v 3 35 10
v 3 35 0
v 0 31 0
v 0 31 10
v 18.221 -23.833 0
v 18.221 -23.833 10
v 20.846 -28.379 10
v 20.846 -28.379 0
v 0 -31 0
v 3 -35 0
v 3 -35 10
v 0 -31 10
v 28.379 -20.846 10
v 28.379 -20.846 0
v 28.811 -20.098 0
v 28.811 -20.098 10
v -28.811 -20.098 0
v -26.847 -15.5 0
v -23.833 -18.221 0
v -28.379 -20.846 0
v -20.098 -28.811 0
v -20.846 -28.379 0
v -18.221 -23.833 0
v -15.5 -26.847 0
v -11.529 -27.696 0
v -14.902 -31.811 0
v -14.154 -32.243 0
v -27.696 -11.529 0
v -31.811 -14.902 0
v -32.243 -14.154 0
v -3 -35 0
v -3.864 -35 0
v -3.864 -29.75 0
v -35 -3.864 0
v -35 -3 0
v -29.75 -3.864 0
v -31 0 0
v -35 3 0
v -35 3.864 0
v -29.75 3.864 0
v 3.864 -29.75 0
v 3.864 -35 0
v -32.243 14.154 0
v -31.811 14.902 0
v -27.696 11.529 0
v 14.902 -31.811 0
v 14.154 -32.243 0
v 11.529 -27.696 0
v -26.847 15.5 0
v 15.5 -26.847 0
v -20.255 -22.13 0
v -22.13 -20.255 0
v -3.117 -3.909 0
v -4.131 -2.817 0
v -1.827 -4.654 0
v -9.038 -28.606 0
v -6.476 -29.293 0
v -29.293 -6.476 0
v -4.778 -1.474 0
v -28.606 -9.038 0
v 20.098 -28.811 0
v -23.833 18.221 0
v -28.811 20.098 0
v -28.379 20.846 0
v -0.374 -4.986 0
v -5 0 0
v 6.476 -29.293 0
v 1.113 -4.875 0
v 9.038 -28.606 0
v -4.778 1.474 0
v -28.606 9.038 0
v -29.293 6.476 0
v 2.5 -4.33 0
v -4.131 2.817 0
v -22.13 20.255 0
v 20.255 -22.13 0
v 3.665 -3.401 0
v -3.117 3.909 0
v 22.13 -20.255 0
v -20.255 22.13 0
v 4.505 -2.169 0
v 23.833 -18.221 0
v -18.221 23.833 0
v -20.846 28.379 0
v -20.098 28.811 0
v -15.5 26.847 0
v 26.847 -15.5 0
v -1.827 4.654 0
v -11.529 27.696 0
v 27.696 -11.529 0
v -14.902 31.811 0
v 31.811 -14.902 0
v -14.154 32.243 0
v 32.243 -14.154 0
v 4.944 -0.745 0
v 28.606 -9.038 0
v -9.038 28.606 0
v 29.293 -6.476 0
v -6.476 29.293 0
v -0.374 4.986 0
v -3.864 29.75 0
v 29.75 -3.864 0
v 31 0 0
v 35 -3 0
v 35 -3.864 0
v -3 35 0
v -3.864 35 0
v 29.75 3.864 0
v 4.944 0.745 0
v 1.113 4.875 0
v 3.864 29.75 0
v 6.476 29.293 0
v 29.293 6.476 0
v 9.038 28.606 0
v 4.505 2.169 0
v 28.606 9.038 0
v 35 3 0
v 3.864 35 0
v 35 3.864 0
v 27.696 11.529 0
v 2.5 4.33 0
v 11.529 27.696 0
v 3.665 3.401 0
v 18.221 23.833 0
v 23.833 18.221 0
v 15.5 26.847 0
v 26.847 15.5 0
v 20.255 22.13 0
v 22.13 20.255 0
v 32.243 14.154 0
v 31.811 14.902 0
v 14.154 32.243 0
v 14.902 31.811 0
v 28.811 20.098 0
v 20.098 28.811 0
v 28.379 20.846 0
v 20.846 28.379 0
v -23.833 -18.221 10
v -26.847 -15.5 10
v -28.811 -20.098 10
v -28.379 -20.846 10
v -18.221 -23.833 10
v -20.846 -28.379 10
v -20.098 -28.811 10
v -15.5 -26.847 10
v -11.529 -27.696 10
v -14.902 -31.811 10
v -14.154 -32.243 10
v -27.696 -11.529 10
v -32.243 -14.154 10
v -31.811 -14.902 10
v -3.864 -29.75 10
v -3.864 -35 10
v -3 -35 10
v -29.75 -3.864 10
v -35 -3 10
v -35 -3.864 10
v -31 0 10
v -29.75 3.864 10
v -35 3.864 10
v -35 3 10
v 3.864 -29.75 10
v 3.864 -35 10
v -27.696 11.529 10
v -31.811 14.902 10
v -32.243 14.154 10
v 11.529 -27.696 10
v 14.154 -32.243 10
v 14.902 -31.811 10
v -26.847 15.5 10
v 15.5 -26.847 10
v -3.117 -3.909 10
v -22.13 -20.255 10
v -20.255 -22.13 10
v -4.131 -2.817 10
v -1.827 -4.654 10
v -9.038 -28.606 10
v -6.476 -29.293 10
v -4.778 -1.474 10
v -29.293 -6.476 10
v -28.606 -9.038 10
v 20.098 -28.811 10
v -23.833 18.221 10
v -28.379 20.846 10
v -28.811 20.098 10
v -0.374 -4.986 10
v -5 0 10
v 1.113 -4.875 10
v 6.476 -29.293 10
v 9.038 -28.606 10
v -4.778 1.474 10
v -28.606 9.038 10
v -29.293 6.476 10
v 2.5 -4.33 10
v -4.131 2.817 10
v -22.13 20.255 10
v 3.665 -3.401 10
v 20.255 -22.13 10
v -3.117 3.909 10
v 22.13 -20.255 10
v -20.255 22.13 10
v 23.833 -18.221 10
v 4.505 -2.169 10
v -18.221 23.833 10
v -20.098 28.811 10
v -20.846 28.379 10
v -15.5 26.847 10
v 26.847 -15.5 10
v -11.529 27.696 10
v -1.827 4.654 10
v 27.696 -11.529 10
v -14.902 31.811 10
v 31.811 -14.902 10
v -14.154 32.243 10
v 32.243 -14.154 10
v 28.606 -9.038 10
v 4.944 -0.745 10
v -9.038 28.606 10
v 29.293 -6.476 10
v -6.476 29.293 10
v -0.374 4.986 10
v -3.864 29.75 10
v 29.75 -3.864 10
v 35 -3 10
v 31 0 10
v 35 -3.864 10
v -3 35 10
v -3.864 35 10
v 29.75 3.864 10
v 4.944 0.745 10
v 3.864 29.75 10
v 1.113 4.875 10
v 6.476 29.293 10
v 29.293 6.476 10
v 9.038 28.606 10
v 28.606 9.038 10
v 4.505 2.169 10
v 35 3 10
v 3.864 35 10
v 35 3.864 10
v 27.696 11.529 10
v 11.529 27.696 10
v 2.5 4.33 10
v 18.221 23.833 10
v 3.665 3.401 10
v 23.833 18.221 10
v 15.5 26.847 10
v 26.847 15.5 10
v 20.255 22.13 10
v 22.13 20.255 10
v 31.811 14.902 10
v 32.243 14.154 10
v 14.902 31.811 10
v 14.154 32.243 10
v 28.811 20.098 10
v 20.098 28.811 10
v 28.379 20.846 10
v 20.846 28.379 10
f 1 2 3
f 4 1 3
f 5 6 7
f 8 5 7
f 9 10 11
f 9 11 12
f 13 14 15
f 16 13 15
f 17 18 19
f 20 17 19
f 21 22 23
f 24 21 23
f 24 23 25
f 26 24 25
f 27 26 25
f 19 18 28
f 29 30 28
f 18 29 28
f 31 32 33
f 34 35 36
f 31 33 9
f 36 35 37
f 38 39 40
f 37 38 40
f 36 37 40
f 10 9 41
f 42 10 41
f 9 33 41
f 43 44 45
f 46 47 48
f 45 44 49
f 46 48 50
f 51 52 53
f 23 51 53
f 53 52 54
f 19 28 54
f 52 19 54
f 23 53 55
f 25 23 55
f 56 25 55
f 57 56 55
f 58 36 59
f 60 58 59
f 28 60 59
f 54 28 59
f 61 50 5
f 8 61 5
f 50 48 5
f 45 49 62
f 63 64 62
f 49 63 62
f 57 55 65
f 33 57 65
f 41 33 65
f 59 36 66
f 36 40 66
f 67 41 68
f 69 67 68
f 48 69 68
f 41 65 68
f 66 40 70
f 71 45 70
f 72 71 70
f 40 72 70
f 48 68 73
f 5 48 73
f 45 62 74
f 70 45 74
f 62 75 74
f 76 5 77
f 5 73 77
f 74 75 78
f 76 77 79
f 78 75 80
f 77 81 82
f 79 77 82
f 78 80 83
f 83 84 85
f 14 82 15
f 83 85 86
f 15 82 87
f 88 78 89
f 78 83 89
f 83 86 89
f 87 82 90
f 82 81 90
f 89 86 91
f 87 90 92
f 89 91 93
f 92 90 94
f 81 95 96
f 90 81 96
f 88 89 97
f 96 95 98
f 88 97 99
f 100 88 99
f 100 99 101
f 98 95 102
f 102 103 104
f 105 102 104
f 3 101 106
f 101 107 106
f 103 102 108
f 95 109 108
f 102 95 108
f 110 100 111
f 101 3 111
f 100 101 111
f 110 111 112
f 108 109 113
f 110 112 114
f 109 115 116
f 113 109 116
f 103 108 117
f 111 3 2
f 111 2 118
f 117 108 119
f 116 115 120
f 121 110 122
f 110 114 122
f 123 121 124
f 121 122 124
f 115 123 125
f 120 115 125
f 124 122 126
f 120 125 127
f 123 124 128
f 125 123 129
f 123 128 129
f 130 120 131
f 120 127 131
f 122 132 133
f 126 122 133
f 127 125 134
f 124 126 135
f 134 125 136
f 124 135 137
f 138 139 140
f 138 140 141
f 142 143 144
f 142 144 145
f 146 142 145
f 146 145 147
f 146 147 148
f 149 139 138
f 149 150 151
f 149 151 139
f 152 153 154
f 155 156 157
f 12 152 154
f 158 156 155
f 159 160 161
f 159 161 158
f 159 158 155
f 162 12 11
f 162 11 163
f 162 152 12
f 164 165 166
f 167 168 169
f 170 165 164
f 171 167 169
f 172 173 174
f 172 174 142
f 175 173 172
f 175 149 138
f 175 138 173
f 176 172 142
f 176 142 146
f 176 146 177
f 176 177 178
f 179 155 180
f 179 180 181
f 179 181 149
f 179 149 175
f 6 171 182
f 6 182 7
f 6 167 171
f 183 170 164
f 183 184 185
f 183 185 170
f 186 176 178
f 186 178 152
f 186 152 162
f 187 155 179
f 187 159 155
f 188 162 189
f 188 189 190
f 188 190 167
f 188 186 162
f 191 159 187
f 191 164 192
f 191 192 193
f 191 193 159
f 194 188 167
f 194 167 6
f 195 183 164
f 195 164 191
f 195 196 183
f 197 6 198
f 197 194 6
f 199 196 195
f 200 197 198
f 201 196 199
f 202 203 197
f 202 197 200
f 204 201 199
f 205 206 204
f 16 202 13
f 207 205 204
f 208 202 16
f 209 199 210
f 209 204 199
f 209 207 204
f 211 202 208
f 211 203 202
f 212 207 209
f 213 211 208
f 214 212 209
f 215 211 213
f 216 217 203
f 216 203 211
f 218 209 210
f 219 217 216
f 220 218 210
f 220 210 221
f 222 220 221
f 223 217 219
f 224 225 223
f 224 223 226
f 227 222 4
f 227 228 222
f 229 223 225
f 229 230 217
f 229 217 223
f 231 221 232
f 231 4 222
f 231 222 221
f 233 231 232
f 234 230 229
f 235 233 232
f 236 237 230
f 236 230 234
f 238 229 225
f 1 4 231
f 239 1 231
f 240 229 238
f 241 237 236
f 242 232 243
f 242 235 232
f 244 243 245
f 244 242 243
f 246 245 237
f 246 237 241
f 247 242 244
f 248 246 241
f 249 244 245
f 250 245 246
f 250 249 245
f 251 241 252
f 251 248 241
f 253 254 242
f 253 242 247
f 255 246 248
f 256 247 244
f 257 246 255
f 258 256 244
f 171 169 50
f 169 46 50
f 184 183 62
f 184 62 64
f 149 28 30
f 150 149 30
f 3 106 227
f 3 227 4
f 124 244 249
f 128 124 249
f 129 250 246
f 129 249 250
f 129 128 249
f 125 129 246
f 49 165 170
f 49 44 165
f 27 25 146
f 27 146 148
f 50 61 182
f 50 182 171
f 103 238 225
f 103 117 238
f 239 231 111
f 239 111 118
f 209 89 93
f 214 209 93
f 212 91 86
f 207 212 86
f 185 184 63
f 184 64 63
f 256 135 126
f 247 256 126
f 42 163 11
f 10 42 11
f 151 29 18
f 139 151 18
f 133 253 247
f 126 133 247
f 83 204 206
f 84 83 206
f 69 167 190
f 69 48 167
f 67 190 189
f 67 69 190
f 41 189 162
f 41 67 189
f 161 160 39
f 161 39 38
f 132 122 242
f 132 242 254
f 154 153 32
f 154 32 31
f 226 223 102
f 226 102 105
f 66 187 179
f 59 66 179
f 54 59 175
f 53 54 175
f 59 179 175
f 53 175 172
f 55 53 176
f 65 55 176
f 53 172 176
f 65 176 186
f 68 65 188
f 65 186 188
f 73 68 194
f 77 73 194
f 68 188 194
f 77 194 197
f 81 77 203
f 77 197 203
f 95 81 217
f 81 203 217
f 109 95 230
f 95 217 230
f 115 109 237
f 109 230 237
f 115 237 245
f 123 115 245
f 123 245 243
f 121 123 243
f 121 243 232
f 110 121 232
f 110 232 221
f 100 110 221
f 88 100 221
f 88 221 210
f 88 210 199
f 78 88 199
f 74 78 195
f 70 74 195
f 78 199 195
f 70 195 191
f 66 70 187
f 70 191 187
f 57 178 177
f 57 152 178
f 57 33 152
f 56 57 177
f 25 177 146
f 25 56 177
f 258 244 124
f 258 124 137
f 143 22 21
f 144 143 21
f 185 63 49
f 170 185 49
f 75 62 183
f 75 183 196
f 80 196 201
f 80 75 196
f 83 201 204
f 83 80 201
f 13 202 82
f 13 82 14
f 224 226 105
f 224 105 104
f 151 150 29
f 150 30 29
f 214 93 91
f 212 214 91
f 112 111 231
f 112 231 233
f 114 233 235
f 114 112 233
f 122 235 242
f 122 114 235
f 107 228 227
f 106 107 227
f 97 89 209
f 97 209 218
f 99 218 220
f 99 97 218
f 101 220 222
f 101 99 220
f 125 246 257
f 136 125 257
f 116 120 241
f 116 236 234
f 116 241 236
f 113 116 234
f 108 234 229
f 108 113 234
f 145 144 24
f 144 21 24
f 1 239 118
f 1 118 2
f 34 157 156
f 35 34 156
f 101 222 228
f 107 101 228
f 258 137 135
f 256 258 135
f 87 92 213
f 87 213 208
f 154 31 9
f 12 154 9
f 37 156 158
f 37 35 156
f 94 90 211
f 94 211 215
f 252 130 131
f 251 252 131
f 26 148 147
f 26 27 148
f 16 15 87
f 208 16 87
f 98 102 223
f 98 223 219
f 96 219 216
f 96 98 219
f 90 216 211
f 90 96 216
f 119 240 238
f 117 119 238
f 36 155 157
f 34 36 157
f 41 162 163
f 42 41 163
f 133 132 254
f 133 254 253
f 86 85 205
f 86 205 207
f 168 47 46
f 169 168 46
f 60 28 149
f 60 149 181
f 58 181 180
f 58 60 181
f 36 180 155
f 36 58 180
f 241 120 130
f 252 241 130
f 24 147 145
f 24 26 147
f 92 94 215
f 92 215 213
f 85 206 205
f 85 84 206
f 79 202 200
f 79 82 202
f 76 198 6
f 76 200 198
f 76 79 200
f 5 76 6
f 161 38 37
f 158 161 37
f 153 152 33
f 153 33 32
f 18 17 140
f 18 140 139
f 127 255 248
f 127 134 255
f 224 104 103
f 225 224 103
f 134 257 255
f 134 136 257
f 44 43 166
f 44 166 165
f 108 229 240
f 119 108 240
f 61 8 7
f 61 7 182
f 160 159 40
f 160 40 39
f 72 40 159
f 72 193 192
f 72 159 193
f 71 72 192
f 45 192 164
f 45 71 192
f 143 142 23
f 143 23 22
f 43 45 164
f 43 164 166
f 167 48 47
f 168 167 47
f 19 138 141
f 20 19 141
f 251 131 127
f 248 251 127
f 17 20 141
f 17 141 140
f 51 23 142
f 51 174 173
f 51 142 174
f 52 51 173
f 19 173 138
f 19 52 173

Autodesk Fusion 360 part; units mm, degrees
sketch "turn wheel" plane through (0, 0, 0) normal (0, 0, 1) x (1, 0, 0)
  circle A0 centre (0, 0) radius 30
  line L0 (-3.8635, 29.7502) -> (-3.8635, 35)
  line L1 (-3.8635, 35) -> (-3, 35)
  line L2 (-3, 35) -> (0, 31)
  line L3 (0, 35) -> (0, 30) construction
  line L4 (3.8635, 29.7502) -> (3.8635, 35)
  line L5 (3.8635, 35) -> (3, 35)
  line L6 (3, 35) -> (0, 31)
  line L7 (-18.2209, 23.8327) -> (-20.8458, 28.3792)
  line L8 (-20.0981, 28.8109) -> (-15.5, 26.8468)
  line L9 (-20.8458, 28.3792) -> (-20.0981, 28.8109)
  line L10 (-14.9019, 31.8109) -> (-15.5, 26.8468)
  line L11 (-14.1542, 32.2426) -> (-14.9019, 31.8109)
  line L12 (-11.5292, 27.6961) -> (-14.1542, 32.2426)
  line L13 (-27.6961, 11.5292) -> (-32.2426, 14.1542)
  line L14 (-31.8109, 14.9019) -> (-26.8468, 15.5)
  line L15 (-32.2426, 14.1542) -> (-31.8109, 14.9019)
  line L16 (-28.8109, 20.0981) -> (-26.8468, 15.5)
  line L17 (-28.3792, 20.8458) -> (-28.8109, 20.0981)
  line L18 (-23.8327, 18.2209) -> (-28.3792, 20.8458)
  line L19 (-29.7502, -3.8635) -> (-35, -3.8635)
  line L20 (-35, -3) -> (-31, 0)
  line L21 (-35, -3.8635) -> (-35, -3)
  line L22 (-35, 3) -> (-31, 0)
  line L23 (-35, 3.8635) -> (-35, 3)
  line L24 (-29.7502, 3.8635) -> (-35, 3.8635)
  line L25 (-23.8327, -18.2209) -> (-28.3792, -20.8458)
  line L26 (-28.8109, -20.0981) -> (-26.8468, -15.5)
  line L27 (-28.3792, -20.8458) -> (-28.8109, -20.0981)
  line L28 (-31.8109, -14.9019) -> (-26.8468, -15.5)
  line L29 (-32.2426, -14.1542) -> (-31.8109, -14.9019)
  line L30 (-27.6961, -11.5292) -> (-32.2426, -14.1542)
  line L31 (-11.5292, -27.6961) -> (-14.1542, -32.2426)
  line L32 (-14.9019, -31.8109) -> (-15.5, -26.8468)
  line L33 (-14.1542, -32.2426) -> (-14.9019, -31.8109)
  line L34 (-20.0981, -28.8109) -> (-15.5, -26.8468)
  line L35 (-20.8458, -28.3792) -> (-20.0981, -28.8109)
  line L36 (-18.2209, -23.8327) -> (-20.8458, -28.3792)
  line L37 (3.8635, -29.7502) -> (3.8635, -35)
  line L38 (3, -35) -> (0, -31)
  line L39 (3.8635, -35) -> (3, -35)
  line L40 (-3, -35) -> (0, -31)
  line L41 (-3.8635, -35) -> (-3, -35)
  line L42 (-3.8635, -29.7502) -> (-3.8635, -35)
  line L43 (18.2209, -23.8327) -> (20.8458, -28.3792)
  line L44 (20.0981, -28.8109) -> (15.5, -26.8468)
  line L45 (20.8458, -28.3792) -> (20.0981, -28.8109)
  line L46 (14.9019, -31.8109) -> (15.5, -26.8468)
  line L47 (14.1542, -32.2426) -> (14.9019, -31.8109)
  line L48 (11.5292, -27.6961) -> (14.1542, -32.2426)
  line L49 (27.6961, -11.5292) -> (32.2426, -14.1542)
  line L50 (31.8109, -14.9019) -> (26.8468, -15.5)
  line L51 (32.2426, -14.1542) -> (31.8109, -14.9019)
  line L52 (28.8109, -20.0981) -> (26.8468, -15.5)
  line L53 (28.3792, -20.8458) -> (28.8109, -20.0981)
  line L54 (23.8327, -18.2209) -> (28.3792, -20.8458)
  line L55 (29.7502, 3.8635) -> (35, 3.8635)
  line L56 (35, 3) -> (31, 0)
  line L57 (35, 3.8635) -> (35, 3)
  line L58 (35, -3) -> (31, 0)
  line L59 (35, -3.8635) -> (35, -3)
  line L60 (29.7502, -3.8635) -> (35, -3.8635)
  line L61 (23.8327, 18.2209) -> (28.3792, 20.8458)
  line L62 (28.8109, 20.0981) -> (26.8468, 15.5)
  line L63 (28.3792, 20.8458) -> (28.8109, 20.0981)
  line L64 (31.8109, 14.9019) -> (26.8468, 15.5)
  line L65 (32.2426, 14.1542) -> (31.8109, 14.9019)
  line L66 (27.6961, 11.5292) -> (32.2426, 14.1542)
  line L67 (11.5292, 27.6961) -> (14.1542, 32.2426)
  line L68 (14.9019, 31.8109) -> (15.5, 26.8468)
  line L69 (14.1542, 32.2426) -> (14.9019, 31.8109)
  line L70 (20.0981, 28.8109) -> (15.5, 26.8468)
  line L71 (20.8458, 28.3792) -> (20.0981, 28.8109)
  line L72 (18.2209, 23.8327) -> (20.8458, 28.3792)
  dimension "d1" = 60
  dimension "d2" = 5.2498
  dimension "d3" = 0.8635
  dimension "d4" = 5
  dimension "d6" = 360
extrude "Extrude1" add sketch "turn wheel" along normal blind 10
sketch "hole punch" plane through (0, 0, 10) normal (0, 0, 1) x (-1, 0, 0)
  arc A0 (-23.8327, -18.2209) -> (-18.2209, -23.8327) centre (0, 0) ccw
  line L0 (-18.2209, -23.8327) -> (-20.8458, -28.3792)
  line L1 (-20.8458, -28.3792) -> (-20.0981, -28.8109)
  line L2 (-20.0981, -28.8109) -> (-15.5, -26.8468)
  line L3 (-15.5, -26.8468) -> (-14.9019, -31.8109)
  line L4 (-14.9019, -31.8109) -> (-14.1542, -32.2426)
  line L5 (-14.1542, -32.2426) -> (-11.5292, -27.6961)
  arc A1 (-11.5292, -27.6961) -> (-3.8635, -29.7502) centre (0, 0) ccw
  line L6 (-3.8635, -29.7502) -> (-3.8635, -35)
  line L7 (-3.8635, -35) -> (-3, -35)
  line L8 (-3, -35) -> (0, -31)
  line L9 (0, -31) -> (3, -35)
  line L10 (3, -35) -> (3.8635, -35)
  line L11 (3.8635, -35) -> (3.8635, -29.7502)
  arc A2 (3.8635, -29.7502) -> (11.5292, -27.6961) centre (0, 0) ccw
  line L12 (11.5292, -27.6961) -> (14.1542, -32.2426)
  line L13 (14.1542, -32.2426) -> (14.9019, -31.8109)
  line L14 (14.9019, -31.8109) -> (15.5, -26.8468)
  line L15 (15.5, -26.8468) -> (20.0981, -28.8109)
  line L16 (20.0981, -28.8109) -> (20.8458, -28.3792)
  line L17 (20.8458, -28.3792) -> (18.2209, -23.8327)
  arc A3 (18.2209, -23.8327) -> (23.8327, -18.2209) centre (0, 0) ccw
  line L18 (23.8327, -18.2209) -> (28.3792, -20.8458)
  line L19 (28.3792, -20.8458) -> (28.8109, -20.0981)
  line L20 (28.8109, -20.0981) -> (26.8468, -15.5)
  line L21 (26.8468, -15.5) -> (31.8109, -14.9019)
  line L22 (31.8109, -14.9019) -> (32.2426, -14.1542)
  line L23 (32.2426, -14.1542) -> (27.6961, -11.5292)
  arc A4 (27.6961, -11.5292) -> (29.7502, -3.8635) centre (0, 0) ccw
  line L24 (29.7502, -3.8635) -> (35, -3.8635)
  line L25 (35, -3.8635) -> (35, -3)
  line L26 (35, -3) -> (31, 0)
  line L27 (31, 0) -> (35, 3)
  line L28 (35, 3) -> (35, 3.8635)
  line L29 (35, 3.8635) -> (29.7502, 3.8635)
  arc A5 (29.7502, 3.8635) -> (27.6961, 11.5292) centre (0, 0) ccw
  line L30 (27.6961, 11.5292) -> (32.2426, 14.1542)
  line L31 (32.2426, 14.1542) -> (31.8109, 14.9019)
  line L32 (31.8109, 14.9019) -> (26.8468, 15.5)
  line L33 (26.8468, 15.5) -> (28.8109, 20.0981)
  line L34 (28.8109, 20.0981) -> (28.3792, 20.8458)
  line L35 (28.3792, 20.8458) -> (23.8327, 18.2209)
  arc A6 (23.8327, 18.2209) -> (18.2209, 23.8327) centre (0, 0) ccw
  line L36 (18.2209, 23.8327) -> (20.8458, 28.3792)
  line L37 (20.8458, 28.3792) -> (20.0981, 28.8109)
  line L38 (20.0981, 28.8109) -> (15.5, 26.8468)
  line L39 (15.5, 26.8468) -> (14.9019, 31.8109)
  line L40 (14.9019, 31.8109) -> (14.1542, 32.2426)
  line L41 (14.1542, 32.2426) -> (11.5292, 27.6961)
  arc A7 (11.5292, 27.6961) -> (3.8635, 29.7502) centre (0, 0) ccw
  line L42 (3.8635, 29.7502) -> (3.8635, 35)
  line L43 (3.8635, 35) -> (3, 35)
  line L44 (3, 35) -> (0, 31)
  line L45 (0, 31) -> (-3, 35)
  line L46 (-3, 35) -> (-3.8635, 35)
  line L47 (-3.8635, 35) -> (-3.8635, 29.7502)
  arc A8 (-3.8635, 29.7502) -> (-11.5292, 27.6961) centre (0, 0) ccw
  line L48 (-11.5292, 27.6961) -> (-14.1542, 32.2426)
  line L49 (-14.1542, 32.2426) -> (-14.9019, 31.8109)
  line L50 (-14.9019, 31.8109) -> (-15.5, 26.8468)
  line L51 (-15.5, 26.8468) -> (-20.0981, 28.8109)
  line L52 (-20.0981, 28.8109) -> (-20.8458, 28.3792)
  line L53 (-20.8458, 28.3792) -> (-18.2209, 23.8327)
  arc A9 (-18.2209, 23.8327) -> (-23.8327, 18.2209) centre (0, 0) ccw
  line L54 (-23.8327, 18.2209) -> (-28.3792, 20.8458)
  line L55 (-28.3792, 20.8458) -> (-28.8109, 20.0981)
  line L56 (-28.8109, 20.0981) -> (-26.8468, 15.5)
  line L57 (-26.8468, 15.5) -> (-31.8109, 14.9019)
  line L58 (-31.8109, 14.9019) -> (-32.2426, 14.1542)
  line L59 (-32.2426, 14.1542) -> (-27.6961, 11.5292)
  arc A10 (-27.6961, 11.5292) -> (-29.7502, 3.8635) centre (0, 0) ccw
  line L60 (-29.7502, 3.8635) -> (-35, 3.8635)
  line L61 (-35, 3.8635) -> (-35, 3)
  line L62 (-35, 3) -> (-31, 0)
  line L63 (-31, 0) -> (-35, -3)
  line L64 (-35, -3) -> (-35, -3.8635)
  line L65 (-35, -3.8635) -> (-29.7502, -3.8635)
  arc A11 (-29.7502, -3.8635) -> (-27.6961, -11.5292) centre (0, 0) ccw
  line L66 (-27.6961, -11.5292) -> (-32.2426, -14.1542)
  line L67 (-32.2426, -14.1542) -> (-31.8109, -14.9019)
  line L68 (-31.8109, -14.9019) -> (-26.8468, -15.5)
  line L69 (-26.8468, -15.5) -> (-28.8109, -20.0981)
  line L70 (-28.8109, -20.0981) -> (-28.3792, -20.8458)
  line L71 (-28.3792, -20.8458) -> (-23.8327, -18.2209)
  line L72 (31, 0) -> (-31, 0) construction
  line L73 (0, -31) -> (0, 31) construction
  circle A12 centre (0, 0) radius 5
extrude "Extrude2" cut sketch "hole punch" against normal blind 10 contours A12
